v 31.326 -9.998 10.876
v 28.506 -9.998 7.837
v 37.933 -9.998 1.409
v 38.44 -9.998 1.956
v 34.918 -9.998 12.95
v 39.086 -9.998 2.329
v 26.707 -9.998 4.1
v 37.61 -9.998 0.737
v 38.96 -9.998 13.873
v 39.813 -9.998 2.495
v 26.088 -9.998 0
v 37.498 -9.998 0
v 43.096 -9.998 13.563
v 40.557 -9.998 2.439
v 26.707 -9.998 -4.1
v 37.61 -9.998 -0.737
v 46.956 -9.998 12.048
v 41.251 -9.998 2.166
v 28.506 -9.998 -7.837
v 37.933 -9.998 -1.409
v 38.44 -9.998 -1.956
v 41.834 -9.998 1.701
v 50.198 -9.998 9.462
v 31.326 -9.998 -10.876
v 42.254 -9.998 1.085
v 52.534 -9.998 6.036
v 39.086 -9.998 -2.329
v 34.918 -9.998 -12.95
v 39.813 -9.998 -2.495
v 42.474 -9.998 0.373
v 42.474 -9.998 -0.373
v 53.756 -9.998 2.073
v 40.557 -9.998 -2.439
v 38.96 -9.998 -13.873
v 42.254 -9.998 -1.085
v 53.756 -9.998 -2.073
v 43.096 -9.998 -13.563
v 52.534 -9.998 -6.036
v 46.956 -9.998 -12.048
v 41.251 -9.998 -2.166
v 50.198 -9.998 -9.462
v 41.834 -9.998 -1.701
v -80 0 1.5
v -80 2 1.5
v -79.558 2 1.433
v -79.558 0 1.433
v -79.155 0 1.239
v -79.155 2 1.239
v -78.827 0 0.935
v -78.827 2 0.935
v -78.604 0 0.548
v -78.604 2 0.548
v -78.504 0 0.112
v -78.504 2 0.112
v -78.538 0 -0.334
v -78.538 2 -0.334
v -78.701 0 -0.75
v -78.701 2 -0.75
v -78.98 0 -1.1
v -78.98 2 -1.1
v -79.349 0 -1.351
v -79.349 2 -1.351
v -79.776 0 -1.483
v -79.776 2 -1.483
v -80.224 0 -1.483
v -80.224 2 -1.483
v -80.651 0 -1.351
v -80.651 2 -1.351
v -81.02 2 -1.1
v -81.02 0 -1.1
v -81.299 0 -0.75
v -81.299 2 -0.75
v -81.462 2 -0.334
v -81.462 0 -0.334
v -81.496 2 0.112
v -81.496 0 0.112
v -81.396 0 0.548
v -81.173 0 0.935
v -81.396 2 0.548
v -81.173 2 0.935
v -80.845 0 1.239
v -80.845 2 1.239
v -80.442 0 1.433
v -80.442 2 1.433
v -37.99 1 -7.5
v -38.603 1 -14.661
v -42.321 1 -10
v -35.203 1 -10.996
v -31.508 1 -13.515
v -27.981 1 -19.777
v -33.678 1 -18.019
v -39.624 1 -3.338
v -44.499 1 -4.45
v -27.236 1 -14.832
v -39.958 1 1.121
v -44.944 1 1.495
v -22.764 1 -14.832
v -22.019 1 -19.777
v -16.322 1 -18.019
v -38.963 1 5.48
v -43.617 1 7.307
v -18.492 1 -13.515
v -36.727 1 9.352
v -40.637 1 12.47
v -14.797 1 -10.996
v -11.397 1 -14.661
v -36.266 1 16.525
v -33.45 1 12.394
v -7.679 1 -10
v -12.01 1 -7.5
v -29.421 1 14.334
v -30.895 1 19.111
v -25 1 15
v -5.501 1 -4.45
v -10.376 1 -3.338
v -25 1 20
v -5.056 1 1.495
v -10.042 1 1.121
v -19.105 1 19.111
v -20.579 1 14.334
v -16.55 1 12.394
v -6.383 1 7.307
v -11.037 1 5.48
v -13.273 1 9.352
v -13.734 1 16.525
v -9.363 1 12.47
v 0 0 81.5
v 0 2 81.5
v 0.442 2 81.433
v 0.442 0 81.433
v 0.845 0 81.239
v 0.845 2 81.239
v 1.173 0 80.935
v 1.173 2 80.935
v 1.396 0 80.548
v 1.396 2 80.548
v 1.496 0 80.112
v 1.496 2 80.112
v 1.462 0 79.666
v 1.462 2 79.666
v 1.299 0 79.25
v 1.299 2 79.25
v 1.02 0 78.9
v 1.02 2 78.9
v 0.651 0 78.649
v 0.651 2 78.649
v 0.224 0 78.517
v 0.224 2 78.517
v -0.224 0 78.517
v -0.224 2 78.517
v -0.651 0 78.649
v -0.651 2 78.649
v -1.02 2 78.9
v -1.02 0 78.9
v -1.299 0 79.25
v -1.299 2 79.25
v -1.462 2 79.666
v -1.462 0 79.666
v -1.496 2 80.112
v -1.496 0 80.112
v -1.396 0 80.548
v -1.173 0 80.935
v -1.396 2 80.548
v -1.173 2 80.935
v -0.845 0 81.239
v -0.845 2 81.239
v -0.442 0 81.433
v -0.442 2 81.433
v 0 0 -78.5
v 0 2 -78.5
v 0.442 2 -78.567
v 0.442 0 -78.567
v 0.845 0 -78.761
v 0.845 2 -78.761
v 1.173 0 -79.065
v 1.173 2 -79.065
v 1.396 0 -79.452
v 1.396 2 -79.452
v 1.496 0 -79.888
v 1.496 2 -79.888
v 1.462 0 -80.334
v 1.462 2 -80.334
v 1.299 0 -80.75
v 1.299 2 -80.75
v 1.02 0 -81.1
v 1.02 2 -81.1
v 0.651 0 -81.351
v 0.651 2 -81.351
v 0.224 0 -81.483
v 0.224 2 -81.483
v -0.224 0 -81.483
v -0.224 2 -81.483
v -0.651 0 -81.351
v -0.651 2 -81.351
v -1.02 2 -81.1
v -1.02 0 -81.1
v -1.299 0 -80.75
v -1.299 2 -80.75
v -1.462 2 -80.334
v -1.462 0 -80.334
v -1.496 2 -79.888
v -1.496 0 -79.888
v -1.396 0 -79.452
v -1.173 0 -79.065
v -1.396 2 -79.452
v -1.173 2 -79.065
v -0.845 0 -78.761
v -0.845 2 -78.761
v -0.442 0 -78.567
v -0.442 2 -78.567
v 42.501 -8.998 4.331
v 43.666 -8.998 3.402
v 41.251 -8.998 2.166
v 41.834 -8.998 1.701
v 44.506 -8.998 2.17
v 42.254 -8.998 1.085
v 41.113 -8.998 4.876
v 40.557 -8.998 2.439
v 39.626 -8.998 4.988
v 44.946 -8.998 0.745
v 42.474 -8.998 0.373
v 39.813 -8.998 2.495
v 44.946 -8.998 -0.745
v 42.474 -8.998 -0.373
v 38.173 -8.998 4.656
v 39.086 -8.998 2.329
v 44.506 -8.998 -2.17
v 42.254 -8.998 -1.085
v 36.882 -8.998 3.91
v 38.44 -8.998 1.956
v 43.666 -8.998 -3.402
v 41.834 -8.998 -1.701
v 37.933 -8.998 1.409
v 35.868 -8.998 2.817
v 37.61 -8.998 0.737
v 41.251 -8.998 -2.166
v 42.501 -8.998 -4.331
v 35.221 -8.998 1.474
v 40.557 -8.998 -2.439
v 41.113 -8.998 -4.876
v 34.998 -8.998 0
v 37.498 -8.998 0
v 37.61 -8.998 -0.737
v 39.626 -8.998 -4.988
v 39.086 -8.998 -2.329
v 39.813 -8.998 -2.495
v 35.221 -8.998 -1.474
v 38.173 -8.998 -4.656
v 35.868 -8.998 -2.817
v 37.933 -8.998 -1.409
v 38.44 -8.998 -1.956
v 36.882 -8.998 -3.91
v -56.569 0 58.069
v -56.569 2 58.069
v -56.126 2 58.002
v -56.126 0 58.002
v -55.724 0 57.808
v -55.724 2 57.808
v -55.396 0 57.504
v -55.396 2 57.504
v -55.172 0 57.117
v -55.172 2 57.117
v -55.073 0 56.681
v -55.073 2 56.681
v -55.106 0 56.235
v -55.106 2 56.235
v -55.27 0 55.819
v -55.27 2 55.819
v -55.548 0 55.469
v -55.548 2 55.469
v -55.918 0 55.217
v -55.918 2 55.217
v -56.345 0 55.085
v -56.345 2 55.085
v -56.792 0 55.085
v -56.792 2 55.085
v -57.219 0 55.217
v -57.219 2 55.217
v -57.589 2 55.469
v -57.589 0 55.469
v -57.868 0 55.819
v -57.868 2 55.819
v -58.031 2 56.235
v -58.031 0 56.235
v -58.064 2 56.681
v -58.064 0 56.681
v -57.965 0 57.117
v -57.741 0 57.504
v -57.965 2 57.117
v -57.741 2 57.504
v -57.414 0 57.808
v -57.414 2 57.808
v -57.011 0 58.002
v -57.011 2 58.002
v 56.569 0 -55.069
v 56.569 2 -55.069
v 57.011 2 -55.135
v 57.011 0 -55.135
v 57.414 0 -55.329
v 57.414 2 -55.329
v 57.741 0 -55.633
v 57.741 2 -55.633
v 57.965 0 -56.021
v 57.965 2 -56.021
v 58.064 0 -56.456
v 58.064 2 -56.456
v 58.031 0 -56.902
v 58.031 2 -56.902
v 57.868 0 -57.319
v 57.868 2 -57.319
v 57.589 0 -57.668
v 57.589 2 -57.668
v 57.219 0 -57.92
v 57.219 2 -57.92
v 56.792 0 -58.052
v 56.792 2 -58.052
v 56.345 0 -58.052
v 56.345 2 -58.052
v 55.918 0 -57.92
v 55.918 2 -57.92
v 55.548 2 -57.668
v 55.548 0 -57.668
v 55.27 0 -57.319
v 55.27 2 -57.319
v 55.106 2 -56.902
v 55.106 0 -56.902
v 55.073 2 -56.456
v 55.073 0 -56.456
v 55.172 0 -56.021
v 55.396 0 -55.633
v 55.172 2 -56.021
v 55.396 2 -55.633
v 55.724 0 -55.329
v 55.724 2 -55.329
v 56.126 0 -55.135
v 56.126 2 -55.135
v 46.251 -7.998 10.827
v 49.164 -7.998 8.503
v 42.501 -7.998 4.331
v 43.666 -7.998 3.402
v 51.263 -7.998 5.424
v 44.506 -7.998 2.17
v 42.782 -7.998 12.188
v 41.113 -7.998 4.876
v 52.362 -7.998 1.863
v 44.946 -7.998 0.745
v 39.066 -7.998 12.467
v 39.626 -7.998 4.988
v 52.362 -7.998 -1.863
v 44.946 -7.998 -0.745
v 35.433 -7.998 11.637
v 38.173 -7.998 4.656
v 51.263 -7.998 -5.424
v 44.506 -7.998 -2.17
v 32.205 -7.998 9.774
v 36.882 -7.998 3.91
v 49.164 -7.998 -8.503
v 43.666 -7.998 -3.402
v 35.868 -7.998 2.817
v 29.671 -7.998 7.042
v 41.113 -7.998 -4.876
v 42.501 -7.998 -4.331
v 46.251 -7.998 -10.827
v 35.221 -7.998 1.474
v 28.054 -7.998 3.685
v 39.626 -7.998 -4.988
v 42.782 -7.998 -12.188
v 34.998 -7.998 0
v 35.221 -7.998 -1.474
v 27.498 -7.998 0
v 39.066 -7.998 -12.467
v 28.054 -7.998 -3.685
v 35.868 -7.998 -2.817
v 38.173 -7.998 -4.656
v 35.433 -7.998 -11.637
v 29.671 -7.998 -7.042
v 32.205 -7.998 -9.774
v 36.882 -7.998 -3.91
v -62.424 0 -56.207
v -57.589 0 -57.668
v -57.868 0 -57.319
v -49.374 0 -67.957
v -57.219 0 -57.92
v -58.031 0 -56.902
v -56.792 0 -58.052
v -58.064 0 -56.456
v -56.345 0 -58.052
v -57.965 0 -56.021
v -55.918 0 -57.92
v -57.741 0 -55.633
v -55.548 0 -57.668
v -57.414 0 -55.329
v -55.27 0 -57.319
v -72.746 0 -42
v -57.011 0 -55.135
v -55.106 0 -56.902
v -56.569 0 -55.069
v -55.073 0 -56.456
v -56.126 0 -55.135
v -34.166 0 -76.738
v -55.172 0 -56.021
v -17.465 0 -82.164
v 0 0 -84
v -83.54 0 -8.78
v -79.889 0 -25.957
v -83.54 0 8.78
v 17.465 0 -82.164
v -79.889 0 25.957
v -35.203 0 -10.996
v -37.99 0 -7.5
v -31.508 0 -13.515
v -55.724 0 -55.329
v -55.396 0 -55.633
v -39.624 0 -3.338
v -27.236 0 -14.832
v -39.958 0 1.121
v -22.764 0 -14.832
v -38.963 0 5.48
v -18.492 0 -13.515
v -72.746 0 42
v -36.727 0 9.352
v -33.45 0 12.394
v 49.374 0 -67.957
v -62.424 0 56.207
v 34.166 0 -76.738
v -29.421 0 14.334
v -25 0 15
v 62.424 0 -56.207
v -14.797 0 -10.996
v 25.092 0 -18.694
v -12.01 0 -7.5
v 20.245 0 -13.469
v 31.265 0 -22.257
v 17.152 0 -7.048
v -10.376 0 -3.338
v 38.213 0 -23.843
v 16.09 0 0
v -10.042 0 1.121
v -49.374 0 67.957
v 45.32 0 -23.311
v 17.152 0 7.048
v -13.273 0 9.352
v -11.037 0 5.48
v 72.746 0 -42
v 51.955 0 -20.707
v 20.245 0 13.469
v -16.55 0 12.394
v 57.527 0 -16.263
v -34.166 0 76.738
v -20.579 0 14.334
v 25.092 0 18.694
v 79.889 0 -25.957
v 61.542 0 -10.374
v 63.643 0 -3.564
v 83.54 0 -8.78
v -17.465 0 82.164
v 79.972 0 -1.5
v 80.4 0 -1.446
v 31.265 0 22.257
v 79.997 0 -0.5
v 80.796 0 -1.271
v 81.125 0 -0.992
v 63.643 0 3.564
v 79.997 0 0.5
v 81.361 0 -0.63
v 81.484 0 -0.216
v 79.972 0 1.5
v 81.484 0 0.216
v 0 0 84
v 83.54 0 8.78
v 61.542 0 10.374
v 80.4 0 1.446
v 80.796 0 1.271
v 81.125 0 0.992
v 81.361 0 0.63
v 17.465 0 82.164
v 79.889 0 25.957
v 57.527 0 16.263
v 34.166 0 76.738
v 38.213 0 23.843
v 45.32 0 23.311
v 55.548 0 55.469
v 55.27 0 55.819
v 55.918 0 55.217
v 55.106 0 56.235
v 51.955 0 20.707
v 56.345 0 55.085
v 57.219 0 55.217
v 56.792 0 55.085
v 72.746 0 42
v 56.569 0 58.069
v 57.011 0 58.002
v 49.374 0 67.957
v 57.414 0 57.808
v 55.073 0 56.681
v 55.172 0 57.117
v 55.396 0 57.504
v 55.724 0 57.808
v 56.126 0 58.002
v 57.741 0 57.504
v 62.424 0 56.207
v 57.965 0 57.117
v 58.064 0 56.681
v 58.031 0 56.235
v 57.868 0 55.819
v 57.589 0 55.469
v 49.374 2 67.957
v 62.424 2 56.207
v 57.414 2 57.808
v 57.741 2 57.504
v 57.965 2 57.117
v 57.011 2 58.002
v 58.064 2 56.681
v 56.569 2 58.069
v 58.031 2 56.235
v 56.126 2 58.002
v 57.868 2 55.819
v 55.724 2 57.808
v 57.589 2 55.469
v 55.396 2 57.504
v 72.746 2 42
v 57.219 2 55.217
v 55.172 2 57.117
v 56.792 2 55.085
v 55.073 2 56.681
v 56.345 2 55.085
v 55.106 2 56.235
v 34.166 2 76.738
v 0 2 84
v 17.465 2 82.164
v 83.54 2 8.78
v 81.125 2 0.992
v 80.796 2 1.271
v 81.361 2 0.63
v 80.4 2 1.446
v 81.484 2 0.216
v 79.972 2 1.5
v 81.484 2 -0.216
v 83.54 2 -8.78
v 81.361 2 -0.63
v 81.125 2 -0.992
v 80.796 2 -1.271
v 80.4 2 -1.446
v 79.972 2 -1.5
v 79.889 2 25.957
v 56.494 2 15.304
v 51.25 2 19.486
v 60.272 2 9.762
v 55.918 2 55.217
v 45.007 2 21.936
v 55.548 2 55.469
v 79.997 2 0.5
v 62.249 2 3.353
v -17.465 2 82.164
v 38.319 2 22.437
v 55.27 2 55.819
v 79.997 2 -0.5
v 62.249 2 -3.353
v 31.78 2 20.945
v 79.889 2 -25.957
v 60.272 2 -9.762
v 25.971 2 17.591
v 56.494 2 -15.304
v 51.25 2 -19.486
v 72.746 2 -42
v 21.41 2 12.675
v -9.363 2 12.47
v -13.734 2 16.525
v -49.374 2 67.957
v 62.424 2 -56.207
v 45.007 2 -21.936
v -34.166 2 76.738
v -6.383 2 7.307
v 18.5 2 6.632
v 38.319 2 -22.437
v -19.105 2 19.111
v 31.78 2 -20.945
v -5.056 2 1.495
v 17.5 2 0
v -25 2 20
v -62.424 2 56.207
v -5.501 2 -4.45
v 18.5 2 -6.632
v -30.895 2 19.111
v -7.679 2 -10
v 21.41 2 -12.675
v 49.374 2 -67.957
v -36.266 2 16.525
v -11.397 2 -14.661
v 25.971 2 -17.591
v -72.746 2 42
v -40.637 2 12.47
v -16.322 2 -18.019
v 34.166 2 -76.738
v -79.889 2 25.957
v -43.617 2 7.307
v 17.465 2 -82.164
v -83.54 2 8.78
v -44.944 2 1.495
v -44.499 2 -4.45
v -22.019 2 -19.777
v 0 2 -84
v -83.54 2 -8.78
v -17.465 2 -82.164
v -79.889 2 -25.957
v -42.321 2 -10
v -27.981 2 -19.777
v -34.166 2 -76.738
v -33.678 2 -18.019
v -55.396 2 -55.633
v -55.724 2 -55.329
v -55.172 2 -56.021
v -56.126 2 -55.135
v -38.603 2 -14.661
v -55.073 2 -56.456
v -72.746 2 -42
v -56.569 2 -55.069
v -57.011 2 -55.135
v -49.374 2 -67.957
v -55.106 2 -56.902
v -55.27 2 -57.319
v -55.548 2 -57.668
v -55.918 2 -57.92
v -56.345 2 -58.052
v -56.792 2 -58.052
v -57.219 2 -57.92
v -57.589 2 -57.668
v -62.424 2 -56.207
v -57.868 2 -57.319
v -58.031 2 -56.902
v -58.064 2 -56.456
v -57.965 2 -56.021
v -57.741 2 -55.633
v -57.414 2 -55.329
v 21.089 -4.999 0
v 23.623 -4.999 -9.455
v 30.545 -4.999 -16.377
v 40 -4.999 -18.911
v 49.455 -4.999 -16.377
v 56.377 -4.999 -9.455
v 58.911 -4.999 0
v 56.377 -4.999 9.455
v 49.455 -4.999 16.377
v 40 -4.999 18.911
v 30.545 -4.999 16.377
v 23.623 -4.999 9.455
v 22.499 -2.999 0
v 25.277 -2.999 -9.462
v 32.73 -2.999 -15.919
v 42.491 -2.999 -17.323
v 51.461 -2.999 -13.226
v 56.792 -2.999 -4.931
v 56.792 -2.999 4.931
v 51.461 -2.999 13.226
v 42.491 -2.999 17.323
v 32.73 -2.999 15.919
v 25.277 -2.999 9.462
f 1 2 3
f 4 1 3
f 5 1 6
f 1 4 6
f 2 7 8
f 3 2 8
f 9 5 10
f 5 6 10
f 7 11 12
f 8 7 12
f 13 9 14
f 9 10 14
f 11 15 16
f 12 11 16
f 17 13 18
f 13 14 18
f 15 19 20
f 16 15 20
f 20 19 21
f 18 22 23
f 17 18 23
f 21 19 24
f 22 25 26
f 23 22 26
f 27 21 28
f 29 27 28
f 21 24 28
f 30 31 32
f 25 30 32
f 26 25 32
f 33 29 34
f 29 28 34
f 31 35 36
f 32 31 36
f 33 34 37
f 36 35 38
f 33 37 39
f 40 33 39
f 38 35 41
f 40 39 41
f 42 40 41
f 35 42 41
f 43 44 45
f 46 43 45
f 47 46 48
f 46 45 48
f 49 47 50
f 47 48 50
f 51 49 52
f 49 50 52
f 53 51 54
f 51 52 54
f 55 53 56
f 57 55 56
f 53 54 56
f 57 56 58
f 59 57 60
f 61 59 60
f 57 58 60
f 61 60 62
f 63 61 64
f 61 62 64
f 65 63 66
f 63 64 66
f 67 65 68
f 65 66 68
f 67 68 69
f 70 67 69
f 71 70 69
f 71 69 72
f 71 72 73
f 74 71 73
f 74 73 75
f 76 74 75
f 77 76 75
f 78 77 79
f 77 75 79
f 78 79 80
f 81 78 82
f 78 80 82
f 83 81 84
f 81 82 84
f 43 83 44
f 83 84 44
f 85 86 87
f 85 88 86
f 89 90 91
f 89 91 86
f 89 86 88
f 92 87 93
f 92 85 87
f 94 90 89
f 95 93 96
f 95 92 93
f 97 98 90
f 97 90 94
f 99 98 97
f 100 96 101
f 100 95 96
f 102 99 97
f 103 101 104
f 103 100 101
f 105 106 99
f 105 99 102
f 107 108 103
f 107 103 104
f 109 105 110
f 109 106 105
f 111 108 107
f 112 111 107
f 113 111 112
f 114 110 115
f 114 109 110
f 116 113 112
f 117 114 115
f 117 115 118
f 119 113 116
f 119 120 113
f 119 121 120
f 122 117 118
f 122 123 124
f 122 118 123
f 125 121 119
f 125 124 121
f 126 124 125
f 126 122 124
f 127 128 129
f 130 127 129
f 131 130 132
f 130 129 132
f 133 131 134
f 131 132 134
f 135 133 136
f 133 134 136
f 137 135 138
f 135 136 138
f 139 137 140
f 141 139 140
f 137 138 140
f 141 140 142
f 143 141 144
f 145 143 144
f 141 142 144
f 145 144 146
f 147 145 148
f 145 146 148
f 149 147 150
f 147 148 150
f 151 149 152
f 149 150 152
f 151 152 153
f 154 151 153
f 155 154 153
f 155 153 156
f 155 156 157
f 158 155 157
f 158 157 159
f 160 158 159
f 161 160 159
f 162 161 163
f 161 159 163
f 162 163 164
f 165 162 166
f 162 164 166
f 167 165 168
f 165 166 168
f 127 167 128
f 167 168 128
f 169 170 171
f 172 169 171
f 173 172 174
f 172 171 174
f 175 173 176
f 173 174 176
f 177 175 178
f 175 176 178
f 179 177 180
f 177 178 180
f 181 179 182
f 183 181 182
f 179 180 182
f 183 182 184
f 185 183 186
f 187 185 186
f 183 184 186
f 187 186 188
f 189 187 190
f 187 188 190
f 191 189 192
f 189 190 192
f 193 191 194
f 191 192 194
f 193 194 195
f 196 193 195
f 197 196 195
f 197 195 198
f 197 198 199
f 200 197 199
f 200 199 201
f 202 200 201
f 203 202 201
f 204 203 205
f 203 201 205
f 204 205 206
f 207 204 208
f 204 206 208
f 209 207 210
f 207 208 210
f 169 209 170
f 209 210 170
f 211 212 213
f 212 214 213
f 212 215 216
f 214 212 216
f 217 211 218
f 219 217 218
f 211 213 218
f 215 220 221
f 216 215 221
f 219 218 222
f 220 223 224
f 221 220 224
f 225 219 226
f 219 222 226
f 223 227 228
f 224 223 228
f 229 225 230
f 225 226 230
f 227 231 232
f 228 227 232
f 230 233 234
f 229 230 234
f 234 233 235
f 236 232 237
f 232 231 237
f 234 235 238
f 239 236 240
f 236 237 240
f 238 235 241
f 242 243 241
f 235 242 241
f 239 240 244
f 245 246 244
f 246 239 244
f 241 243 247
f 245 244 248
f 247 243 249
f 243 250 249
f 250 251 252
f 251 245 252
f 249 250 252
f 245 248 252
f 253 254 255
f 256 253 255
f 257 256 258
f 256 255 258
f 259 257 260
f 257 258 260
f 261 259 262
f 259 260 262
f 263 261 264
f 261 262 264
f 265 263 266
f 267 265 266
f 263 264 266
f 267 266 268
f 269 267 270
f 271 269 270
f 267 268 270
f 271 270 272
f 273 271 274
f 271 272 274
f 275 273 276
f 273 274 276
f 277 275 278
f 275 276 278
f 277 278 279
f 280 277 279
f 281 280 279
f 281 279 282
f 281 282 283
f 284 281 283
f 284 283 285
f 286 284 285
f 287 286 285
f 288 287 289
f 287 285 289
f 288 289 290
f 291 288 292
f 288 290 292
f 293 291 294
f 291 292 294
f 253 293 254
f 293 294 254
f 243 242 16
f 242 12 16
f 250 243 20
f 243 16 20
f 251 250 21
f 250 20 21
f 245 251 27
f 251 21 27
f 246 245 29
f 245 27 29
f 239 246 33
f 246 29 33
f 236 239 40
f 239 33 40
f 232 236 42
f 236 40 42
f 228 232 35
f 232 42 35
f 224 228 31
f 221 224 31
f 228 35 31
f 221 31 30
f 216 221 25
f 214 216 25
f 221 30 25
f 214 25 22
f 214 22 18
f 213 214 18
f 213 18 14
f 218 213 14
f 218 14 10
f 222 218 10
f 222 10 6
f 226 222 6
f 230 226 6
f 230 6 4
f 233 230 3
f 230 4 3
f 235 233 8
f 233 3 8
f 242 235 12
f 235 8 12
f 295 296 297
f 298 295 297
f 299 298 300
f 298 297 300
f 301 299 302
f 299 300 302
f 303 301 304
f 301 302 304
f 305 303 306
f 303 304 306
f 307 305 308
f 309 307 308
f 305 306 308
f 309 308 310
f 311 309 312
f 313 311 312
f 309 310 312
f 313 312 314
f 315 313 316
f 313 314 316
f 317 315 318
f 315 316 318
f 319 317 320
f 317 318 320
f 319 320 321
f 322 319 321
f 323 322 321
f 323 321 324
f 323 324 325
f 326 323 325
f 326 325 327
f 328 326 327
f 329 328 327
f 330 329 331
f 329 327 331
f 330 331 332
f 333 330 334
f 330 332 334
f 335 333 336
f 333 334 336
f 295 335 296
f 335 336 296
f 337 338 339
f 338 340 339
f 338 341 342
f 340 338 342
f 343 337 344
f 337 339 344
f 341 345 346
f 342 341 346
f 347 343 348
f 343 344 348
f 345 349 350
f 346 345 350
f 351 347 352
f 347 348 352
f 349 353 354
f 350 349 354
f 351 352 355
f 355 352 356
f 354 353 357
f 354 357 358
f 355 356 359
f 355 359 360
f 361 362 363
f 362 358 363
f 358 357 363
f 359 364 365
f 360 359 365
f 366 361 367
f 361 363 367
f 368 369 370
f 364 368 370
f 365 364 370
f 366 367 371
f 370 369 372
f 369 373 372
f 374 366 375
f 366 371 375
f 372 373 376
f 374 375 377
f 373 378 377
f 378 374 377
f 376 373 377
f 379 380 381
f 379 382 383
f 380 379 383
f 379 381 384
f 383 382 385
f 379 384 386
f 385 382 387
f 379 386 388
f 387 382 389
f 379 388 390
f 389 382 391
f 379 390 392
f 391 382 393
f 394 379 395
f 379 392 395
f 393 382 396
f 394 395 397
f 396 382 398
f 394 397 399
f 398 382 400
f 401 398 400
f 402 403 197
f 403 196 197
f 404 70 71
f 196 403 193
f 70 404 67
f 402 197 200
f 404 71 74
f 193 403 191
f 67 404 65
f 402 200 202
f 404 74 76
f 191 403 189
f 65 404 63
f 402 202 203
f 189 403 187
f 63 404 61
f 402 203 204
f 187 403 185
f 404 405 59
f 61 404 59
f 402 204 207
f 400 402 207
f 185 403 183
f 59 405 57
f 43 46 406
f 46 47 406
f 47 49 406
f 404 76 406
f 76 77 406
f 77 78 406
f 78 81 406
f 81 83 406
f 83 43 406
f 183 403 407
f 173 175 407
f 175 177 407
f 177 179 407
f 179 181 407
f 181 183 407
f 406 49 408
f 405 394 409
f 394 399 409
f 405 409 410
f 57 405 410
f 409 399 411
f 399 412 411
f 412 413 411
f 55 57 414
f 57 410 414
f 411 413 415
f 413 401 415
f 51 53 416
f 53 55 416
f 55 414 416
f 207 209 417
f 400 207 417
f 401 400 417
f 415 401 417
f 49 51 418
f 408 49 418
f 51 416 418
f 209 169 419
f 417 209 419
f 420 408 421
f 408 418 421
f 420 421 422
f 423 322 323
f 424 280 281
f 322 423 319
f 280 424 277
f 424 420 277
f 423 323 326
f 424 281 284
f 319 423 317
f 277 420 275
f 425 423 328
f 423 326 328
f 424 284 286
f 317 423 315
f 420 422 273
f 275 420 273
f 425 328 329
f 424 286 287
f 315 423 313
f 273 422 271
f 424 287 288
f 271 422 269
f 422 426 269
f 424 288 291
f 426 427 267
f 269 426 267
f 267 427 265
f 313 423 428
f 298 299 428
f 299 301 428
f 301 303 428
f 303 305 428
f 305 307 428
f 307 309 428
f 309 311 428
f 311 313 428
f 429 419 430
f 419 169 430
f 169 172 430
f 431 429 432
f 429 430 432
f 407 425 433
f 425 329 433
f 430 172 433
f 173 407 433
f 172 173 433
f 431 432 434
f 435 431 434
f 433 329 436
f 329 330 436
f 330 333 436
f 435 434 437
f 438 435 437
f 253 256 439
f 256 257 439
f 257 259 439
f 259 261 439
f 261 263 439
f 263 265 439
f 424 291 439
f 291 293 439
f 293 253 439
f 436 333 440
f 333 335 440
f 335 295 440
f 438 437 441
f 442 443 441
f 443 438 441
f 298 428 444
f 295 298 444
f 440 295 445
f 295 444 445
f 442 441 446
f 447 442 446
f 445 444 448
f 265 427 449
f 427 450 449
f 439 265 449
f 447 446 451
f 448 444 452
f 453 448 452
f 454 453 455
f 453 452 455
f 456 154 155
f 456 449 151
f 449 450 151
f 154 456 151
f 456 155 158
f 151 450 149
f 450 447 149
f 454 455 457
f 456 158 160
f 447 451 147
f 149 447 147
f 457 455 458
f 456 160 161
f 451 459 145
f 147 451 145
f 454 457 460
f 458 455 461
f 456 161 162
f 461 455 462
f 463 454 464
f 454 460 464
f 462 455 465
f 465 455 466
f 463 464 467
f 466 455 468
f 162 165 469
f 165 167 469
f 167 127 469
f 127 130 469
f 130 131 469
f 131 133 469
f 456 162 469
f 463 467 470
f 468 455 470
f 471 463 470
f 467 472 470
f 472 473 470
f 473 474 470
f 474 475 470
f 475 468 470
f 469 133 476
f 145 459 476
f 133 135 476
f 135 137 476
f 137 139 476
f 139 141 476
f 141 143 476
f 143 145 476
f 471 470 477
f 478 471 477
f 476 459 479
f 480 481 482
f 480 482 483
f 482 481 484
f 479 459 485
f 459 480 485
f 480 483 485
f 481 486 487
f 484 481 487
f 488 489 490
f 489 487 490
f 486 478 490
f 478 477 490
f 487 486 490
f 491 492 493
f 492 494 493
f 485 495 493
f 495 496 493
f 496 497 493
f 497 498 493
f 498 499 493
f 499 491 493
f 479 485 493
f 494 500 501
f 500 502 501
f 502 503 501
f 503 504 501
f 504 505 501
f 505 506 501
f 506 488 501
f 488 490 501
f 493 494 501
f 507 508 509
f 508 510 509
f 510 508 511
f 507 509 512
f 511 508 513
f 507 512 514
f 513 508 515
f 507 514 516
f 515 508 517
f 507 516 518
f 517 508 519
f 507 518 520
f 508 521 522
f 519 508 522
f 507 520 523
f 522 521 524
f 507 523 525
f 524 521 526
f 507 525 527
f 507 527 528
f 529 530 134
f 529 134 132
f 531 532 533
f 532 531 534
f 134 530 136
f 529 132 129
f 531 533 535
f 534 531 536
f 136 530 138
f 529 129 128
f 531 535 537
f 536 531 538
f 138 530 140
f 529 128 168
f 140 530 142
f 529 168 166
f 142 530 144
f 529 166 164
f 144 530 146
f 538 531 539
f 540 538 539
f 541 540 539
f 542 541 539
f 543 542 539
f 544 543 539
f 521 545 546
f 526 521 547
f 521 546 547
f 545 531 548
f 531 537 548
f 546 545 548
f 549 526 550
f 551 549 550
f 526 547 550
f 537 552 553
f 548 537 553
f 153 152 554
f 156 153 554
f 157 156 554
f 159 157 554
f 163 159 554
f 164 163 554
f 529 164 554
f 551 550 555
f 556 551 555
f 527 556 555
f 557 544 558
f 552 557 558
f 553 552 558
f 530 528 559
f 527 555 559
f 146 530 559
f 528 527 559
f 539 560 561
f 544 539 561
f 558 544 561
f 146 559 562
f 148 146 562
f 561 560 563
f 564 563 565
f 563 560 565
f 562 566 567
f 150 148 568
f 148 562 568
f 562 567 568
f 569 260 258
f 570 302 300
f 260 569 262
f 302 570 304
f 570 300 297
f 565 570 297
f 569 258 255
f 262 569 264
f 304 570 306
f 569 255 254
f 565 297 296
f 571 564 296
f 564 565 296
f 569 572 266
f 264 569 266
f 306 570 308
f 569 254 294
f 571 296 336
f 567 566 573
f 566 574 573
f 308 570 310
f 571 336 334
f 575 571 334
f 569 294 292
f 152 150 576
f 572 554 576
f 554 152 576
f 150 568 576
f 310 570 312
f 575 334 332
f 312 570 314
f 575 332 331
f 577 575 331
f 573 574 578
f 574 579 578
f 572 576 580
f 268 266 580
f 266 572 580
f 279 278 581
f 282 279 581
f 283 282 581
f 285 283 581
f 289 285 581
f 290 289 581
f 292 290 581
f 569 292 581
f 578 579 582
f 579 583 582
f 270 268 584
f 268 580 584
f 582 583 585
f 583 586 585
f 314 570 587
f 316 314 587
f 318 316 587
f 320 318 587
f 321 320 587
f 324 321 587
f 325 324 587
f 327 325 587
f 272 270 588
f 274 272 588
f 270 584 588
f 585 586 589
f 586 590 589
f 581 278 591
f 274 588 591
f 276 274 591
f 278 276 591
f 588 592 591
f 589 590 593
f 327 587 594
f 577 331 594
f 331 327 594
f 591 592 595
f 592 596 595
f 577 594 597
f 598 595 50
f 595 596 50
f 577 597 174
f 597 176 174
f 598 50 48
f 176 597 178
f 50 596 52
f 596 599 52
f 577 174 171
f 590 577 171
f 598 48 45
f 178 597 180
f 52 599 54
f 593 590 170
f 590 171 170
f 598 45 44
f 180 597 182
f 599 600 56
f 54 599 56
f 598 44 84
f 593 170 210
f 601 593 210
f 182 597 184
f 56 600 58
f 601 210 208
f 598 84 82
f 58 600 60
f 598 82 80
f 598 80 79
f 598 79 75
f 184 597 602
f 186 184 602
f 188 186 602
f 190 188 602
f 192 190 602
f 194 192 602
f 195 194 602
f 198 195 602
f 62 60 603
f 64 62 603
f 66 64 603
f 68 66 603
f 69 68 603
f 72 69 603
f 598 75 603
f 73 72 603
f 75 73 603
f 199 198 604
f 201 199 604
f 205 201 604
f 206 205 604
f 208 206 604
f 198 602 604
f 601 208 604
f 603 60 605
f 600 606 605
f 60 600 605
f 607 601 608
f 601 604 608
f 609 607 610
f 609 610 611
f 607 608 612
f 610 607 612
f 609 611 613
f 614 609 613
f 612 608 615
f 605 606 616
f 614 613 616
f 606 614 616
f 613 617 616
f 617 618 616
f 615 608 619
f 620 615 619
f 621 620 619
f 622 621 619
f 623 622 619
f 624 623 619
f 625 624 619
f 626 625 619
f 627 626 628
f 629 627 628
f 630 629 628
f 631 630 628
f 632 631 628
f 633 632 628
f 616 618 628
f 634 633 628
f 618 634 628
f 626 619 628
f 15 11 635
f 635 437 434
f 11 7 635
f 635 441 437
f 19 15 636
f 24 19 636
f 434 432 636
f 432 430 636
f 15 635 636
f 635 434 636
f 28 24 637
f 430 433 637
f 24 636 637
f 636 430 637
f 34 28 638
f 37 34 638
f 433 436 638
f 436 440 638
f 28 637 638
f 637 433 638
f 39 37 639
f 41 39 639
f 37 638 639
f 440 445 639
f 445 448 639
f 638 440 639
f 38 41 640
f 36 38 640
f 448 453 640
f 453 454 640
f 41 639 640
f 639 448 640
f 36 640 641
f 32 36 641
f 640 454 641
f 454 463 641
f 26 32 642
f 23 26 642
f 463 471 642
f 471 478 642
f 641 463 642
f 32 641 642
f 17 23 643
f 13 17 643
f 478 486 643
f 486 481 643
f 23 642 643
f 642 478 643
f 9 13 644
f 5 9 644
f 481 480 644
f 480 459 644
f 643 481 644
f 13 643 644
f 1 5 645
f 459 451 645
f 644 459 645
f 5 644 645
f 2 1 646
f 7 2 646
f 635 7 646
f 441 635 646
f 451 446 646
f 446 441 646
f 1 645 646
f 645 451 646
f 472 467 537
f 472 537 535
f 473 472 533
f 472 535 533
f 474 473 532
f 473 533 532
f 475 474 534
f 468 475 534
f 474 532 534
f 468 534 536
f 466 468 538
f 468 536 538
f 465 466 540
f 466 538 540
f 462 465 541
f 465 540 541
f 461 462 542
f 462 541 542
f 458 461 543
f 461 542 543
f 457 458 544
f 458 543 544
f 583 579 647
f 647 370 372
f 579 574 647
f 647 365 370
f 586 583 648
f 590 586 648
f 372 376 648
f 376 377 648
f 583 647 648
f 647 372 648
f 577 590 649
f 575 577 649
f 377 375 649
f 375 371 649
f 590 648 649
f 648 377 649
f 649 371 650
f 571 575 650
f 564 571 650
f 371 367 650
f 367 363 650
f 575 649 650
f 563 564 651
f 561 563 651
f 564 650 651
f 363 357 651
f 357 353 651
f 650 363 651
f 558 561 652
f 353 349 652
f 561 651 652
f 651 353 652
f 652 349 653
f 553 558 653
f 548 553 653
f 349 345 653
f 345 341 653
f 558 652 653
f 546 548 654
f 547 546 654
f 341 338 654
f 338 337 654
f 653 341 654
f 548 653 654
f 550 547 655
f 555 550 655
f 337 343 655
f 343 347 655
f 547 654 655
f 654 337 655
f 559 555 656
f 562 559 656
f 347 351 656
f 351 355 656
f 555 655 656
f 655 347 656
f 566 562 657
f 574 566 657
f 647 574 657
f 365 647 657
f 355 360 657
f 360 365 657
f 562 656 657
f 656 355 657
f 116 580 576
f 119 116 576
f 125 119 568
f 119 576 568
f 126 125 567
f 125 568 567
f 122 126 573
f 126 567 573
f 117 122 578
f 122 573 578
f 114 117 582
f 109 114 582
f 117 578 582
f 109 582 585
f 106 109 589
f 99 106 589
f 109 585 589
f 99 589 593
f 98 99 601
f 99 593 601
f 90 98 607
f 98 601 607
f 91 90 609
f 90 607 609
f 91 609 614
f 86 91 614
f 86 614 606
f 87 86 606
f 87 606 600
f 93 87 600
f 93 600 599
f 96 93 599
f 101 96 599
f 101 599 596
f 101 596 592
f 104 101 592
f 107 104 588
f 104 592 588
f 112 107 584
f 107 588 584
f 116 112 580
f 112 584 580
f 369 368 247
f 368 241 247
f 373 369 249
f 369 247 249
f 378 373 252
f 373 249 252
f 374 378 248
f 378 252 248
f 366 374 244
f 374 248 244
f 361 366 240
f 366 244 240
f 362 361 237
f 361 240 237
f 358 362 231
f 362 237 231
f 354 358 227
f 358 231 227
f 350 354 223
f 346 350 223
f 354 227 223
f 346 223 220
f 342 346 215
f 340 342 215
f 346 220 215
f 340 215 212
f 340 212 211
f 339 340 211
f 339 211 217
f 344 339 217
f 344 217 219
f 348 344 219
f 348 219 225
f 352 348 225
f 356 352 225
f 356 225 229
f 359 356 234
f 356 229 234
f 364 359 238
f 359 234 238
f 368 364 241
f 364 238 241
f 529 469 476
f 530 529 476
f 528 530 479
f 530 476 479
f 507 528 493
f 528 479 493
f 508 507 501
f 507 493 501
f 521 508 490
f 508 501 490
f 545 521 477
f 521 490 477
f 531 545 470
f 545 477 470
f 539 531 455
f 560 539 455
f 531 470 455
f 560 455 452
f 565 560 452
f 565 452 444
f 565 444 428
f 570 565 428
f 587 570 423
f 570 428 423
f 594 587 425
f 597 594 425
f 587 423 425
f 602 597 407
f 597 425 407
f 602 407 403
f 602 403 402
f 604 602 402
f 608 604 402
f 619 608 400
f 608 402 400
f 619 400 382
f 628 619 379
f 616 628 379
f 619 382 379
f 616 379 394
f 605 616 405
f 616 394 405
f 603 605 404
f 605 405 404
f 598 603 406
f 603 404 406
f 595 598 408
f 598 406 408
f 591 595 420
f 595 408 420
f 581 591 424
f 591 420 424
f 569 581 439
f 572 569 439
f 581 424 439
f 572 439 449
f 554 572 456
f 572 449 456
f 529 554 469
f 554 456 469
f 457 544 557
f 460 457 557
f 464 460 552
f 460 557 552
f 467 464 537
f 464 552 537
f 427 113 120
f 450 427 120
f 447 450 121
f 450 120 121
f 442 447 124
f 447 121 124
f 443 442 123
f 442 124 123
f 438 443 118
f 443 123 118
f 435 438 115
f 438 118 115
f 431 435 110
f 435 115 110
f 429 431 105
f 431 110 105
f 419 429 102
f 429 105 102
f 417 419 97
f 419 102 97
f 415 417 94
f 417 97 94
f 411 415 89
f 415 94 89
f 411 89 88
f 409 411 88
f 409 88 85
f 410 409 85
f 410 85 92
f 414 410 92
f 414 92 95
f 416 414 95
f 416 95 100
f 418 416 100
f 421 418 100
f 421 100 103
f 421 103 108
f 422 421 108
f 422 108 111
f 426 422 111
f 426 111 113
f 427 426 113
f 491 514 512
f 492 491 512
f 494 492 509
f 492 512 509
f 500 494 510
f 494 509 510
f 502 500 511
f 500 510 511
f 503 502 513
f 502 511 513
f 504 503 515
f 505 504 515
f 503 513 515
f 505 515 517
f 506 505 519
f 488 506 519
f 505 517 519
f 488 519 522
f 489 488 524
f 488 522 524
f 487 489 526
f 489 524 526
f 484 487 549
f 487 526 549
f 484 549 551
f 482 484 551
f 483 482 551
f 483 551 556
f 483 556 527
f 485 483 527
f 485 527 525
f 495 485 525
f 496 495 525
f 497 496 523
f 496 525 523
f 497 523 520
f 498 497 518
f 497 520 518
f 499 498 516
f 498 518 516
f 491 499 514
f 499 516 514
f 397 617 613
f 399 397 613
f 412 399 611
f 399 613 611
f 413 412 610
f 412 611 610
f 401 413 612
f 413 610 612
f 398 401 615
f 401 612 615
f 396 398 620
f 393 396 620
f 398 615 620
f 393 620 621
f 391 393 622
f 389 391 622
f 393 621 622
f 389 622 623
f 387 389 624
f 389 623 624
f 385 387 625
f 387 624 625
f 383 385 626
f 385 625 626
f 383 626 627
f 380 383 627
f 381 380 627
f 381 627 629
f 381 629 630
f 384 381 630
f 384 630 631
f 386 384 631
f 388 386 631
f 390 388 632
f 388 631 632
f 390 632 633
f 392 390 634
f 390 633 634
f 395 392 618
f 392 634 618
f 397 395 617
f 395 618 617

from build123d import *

# Parameters (mm, degrees)
SKETCH_1_R          = 84
EXTRUDE_1_DEPTH     = 2
SKETCH_2_R          = 1.5
CUT_EXTRUDE_1_DEPTH = 2
SKETCH_3_R          = 15
SKETCH_3_R_2        = 22.5
CUT_EXTRUDE_2_DEPTH = 2
SKETCH_4_R          = 20
CUT_EXTRUDE_3_DEPTH = 1


with BuildPart() as part:
    # 草图1 → 凸台-拉伸1 (new body)
    with BuildSketch(Plane(origin=(0, 0, 0), x_dir=(1, 0, 0), z_dir=(0, 1, 0))):
        with Locations(Location((0, 0, 0), (0, 0, 270))):
            Circle(SKETCH_1_R)
    extrude(amount=EXTRUDE_1_DEPTH)

    # 草图2 → 切除-拉伸1 (cut)
    with BuildSketch(Plane(origin=(0, 2, 0), x_dir=(1, 0, 0), z_dir=(0, 1, 0))):
        with Locations(Location((0, 80, 0), (0, 0, 270))):
            Circle(SKETCH_2_R)
        with Locations(Location((56.568542495, 56.568542495, 0), (0, 0, 270))):
            Circle(SKETCH_2_R)
        with Locations(Location((80, 0, 0), (0, 0, 270))):
            Circle(SKETCH_2_R)
        with Locations(Location((56.568542495, -56.568542495, 0), (0, 0, 270))):
            Circle(SKETCH_2_R)
        with Locations(Location((0, -80, 0), (0, 0, 270))):
            Circle(SKETCH_2_R)
        with Locations(Location((-56.568542495, -56.568542495, 0), (0, 0, 270))):
            Circle(SKETCH_2_R)
        with Locations(Location((-80, 0, 0), (0, 0, 270))):
            Circle(SKETCH_2_R)
        with Locations(Location((-56.568542495, 56.568542495, 0), (0, 0, 270))):
            Circle(SKETCH_2_R)
    extrude(amount=-CUT_EXTRUDE_1_DEPTH, mode=Mode.SUBTRACT)

    # 草图3 → 切除-拉伸2 (cut)
    with BuildSketch(Plane(origin=(0, 2, 0), x_dir=(1, 0, 0), z_dir=(0, 1, 0))):
        with Locations(Location((-25, 0, 0), (0, 0, 270))):
            Circle(SKETCH_3_R)
        with Locations(Location((40, 0, 0), (0, 0, 270))):
            Circle(SKETCH_3_R_2)
    extrude(amount=-CUT_EXTRUDE_2_DEPTH, mode=Mode.SUBTRACT)

    # 草图4 → 切除-拉伸3 (cut)
    with BuildSketch(Plane(origin=(0, 2, 0), x_dir=(1, 0, 0), z_dir=(0, 1, 0))):
        with Locations(Location((-25, 0, 0), (0, 0, 270))):
            Circle(SKETCH_4_R)
    extrude(amount=-CUT_EXTRUDE_3_DEPTH, mode=Mode.SUBTRACT)

    # 草图6 → 旋转1 (revolve)
    with BuildSketch(Plane.XY):
        Polygon((0, 2), (17.5, 2), (27.498489886, -7.998489886), (34.998489886, -7.998489886), (34.998489886, -8.998489886), (37.498489886, -8.998489886), (37.498489886, -9.998489886), (26.088489886, -9.998489886), (16.09, 0), (0, 0), align=None)
    revolve(axis=Axis((40, 0, 0), (0, -1, 0)))


solid = part.part
